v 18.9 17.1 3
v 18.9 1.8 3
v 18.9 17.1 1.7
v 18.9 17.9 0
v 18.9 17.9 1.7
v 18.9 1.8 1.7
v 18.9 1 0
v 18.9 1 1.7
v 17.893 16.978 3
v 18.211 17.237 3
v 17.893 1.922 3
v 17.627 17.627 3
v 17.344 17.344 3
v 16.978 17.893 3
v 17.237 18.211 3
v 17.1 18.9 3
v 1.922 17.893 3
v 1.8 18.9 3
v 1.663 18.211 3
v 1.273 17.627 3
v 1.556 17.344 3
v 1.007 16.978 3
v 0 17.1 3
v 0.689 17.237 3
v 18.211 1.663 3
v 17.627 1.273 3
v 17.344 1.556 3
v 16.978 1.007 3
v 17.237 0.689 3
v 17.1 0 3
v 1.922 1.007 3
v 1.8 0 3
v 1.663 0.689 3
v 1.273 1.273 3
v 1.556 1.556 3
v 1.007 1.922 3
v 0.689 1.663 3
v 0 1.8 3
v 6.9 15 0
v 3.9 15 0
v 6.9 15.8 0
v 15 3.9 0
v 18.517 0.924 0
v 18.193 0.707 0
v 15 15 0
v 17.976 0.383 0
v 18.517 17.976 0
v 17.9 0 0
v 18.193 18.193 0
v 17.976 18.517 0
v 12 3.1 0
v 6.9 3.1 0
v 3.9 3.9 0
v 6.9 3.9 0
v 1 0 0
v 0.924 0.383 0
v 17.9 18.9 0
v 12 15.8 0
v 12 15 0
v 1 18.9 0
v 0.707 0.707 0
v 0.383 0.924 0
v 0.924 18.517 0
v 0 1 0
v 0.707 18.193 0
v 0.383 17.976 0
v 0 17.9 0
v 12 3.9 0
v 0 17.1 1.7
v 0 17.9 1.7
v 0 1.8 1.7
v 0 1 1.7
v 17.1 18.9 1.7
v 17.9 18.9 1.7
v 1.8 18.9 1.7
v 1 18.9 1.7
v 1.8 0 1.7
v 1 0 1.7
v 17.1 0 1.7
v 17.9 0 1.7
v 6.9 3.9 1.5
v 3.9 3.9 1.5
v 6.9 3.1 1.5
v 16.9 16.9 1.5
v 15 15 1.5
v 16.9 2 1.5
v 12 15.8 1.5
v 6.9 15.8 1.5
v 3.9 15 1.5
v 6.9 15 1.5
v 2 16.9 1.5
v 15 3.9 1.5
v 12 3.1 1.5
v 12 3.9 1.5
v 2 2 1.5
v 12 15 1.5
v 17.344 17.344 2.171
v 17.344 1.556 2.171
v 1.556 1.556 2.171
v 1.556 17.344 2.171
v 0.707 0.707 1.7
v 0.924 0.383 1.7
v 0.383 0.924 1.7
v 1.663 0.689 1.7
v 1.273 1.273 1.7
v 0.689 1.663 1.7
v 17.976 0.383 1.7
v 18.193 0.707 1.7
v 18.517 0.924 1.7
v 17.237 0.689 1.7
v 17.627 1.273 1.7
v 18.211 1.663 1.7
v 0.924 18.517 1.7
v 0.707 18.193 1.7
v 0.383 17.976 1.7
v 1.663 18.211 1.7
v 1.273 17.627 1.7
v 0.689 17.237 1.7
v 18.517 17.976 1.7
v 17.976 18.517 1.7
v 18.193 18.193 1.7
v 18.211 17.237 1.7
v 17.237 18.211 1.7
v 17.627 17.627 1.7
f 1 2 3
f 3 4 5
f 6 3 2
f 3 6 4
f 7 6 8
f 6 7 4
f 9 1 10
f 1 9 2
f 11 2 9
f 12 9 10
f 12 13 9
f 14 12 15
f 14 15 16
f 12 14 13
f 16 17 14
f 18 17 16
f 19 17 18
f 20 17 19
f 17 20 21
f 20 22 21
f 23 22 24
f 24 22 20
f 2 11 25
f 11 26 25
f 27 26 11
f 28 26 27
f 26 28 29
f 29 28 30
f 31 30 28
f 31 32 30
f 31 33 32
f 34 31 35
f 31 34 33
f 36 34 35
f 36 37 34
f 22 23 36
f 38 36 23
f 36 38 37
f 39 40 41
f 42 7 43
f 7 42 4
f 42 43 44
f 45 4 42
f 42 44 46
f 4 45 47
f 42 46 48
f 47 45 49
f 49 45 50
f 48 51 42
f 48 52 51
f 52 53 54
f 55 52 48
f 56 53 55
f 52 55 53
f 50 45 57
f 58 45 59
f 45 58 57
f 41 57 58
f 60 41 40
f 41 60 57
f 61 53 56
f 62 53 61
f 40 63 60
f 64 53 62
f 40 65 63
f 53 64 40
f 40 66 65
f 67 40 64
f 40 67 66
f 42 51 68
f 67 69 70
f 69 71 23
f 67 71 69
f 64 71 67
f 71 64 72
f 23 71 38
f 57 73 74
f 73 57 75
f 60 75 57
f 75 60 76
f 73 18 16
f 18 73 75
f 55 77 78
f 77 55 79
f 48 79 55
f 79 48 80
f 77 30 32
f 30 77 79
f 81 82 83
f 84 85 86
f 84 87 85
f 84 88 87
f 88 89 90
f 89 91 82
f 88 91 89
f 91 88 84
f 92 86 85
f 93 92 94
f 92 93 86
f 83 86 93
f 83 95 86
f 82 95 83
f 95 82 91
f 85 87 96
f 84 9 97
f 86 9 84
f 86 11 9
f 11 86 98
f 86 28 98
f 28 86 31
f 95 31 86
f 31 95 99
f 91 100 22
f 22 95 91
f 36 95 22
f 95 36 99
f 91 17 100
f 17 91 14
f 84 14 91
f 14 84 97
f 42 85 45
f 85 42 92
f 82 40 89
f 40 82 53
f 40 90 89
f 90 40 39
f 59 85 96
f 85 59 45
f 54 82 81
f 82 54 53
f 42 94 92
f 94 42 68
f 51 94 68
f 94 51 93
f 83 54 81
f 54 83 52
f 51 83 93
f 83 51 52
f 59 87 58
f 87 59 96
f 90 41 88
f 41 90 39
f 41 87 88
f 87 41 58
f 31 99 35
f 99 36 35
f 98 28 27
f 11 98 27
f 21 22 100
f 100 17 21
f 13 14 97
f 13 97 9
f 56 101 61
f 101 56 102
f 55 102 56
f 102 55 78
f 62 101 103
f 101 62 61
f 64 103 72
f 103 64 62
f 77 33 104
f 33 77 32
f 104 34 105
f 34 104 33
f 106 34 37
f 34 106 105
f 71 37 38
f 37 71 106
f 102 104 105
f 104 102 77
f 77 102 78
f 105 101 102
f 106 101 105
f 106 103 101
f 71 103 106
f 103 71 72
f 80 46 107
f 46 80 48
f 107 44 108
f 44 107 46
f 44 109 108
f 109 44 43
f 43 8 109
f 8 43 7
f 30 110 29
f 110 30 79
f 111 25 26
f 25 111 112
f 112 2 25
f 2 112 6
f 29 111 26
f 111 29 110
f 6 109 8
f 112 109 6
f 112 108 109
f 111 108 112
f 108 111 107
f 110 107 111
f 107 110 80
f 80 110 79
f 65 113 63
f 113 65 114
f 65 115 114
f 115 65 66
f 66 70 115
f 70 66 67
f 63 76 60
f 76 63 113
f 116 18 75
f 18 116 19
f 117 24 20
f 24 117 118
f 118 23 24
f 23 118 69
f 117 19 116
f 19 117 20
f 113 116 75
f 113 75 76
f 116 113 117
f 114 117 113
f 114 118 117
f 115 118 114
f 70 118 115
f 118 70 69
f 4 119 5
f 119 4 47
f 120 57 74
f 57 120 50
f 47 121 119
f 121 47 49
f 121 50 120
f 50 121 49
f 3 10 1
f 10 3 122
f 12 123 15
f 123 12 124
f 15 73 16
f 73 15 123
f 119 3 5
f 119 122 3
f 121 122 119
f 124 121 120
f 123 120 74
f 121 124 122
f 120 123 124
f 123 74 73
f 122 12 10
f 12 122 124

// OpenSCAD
//OpenSCAD-Skript

//Moduldefinition mit Parametern für Frontplattensystem im 19mm-Raster
module FrontElem (
//Parameter
xwert=1,        //Anzahl der Segmente in horizontaler Richtung
ywert=1,        //Anzahl der Segmente in vertikaler Richtung
segment=18.9,   //Kantenlänge des Segments
hght=3.0,       //Höhe des Rands des Frontplattensegments
thick=1.5,      //verbleibende Dicke des Frontplattensegments
wo=1.0,         //Wandstärke oben
wu=2.0,         //Wandstärke unten
M3=false,       //Bohrungen für M3-Zylinderkopf-Inbusschraube
skd3=5.6,       //Schraubenkopfdurchmesser M3-Schraube
skh3=3.3,       //Schraubenkopfhöhe M3-Schraube
dsh3=3.1,       //Schaftdurchmesser M3-Schraube
dvst3=7,        //Verstärkung für M3-Schraube
B2mm=true,      //Bohrungen für 2mm-Schneidschrauben
skd2=3.6,       //Schraubenkopfdurchmesser 2mm-Schraube (4.4)
skh2=1.3,       //Schraubenkopfhöhe 2mm-Schraube
dsh2=2.0,       //Schaftdurchmesser 2mm-Schraube
dvst2=4.4,      //Verstärkung für 2mm-Schraube
Btext=6.0,      //Breite Beschriftungsband
Ltext=12,       //Länge Beschriftungsband
Dtext=0.3,      //Tiefe Beschriftungsfeld, oder Null
LEDdia=5.0,     //Durchmesser LED
LEDr=5.0,       //Kantenlänge quadratische LED
LEDB=5.0,       //Breite der Rechteck-LED
LEDH=3.0,       //Höhe der Rechteck-LED
KSWdia=6.0,     //Schaftdurchmesser Kippschalter
RSWdia=9.2,     //Schaftdurchmesser Drehschalter
RSWdist=9.4,    //Mittenabstand Pin
RSWpin=3.0,     //Durchmesser Pin
POTdia=6.8,     //Schaftdurchmesser Poti
TRMdia=4.0,     //Bohrung für Polklemme M4
TRSdia=6.0,     //Bohrung für Telefonbuchse 4mm
MCdia=11.8,     //Bohrung für MC-Buchse 4mm
MCdist=10.4,    //Abstand Abflachungen
BNCdia=9.5,     //Durchmesser Bohrung
BNCdist=8.0,    //Abstand Abflachung
PM3B=22.5,      //Breite Panelmeter 3-stellig
PM3H=14.5,      //Höhe Panelmeter 3-stellig
PM4B=30.0,      //Breite Panelmeter 4-stellig
PM4H=14.2,     //Höhe Panelmeter 4-stellig
leni=6,leno=13.1,swl=8.1,swh=4.1,balken=5.1
)
//Beginn Modul
{
difference(){   //difference 1
union(){        //union 1
difference(){   //difference 2
union(){        //union 2
    //alles, was vor der nächsten geschweiften Klammer steht, wird zusammengefügt (union 2)
//Körper des Frontplattensegments
cube([xwert*segment, ywert*segment, hght]);


}               //union 2 end
    //alles, was vor der nächsten geschweiften Klammer steht, wird davon abgezogen (difference 2)
//Einsenkung in das Segment
polyhedron(
               points= [[wu,wu,thick],                                  //0 unten
                        [xwert*segment-wu,wu,thick],                    //1 unten
                        [xwert*segment-wu,ywert*segment-wu,thick],      //2 unten
                        [wu,ywert*segment-wu,thick],                    //3 unten
                        [wo,wo,hght+0.01],                              //4 oben
                        [wo,ywert*segment-wo, hght+0.01],               //5 oben
                        [xwert*segment-wo,ywert*segment-wo,hght+0.01],  //6 oben
                        [xwert*segment-wo,wo,hght+0.01],                //7 oben
                       ],
               faces=  [[0,1,2,3],      //Boden
                        [0,4,7,1],      //Deckel
                        [1,7,6,2],      //Front
                        [2,6,5,3],      //Seitenwand rechts
                        [3,5,4,0],      //Rückwand
                        [4,5,6,7]]      //Seitenwand links
               );   
//Ausschnitt für Tasterhülse
translate([(xwert*segment)/2-leno/2+1,(ywert*segment)/2-leno/2+1,-0.1]) cube([leno-2,leno-2,swh+swl]);
translate([(xwert*segment)/2-balken/2,(ywert*segment)/2-leno/2+0.2,-0.1]) cube([balken,(leno-leni)/2-0.8,swh+swl+3]);
translate([(xwert*segment)/2-balken/2,(ywert*segment)/2+leno/2-0.2-(leno-leni)/2+0.8,-0.1]) cube([balken,(leno-leni)/2-0.8,swh+swl+3]);

/*
//Bohrung für LED mittig (Mindestgröße 1x1)
translate([xwert*segment/2,ywert*segment/2-3,-0.1])  cylinder(d=LEDdia, h=10, $fn=32);
*/

/*
//Bohrung für LED nach unten versetzt mit Textfeld darüber (Mindestgröße 1x1, bei 10mm LED 1x2)
translate([xwert*segment/2,ywert*segment/2-3,-0.1])  cylinder(d=LEDdia, h=10, $fn=32);
translate([xwert*segment/2-Ltext/2,ywert*segment/2,thick-Dtext+0.05])  cube([Ltext, Btext, Dtext]); 
*/

/*
//Bohrung für Kippschalter mittig (Mindestgröße 1x1)
translate([xwert*segment/2,ywert*segment/2,-0.1])  cylinder(d=KSWdia, h=10, $fn=32); 
*/

/*
//Bohrungen für Drehschalter mit Pin (Mindestgröße 2x2)
translate([xwert*segment/2,ywert*segment/2,-0.1])  cylinder(d=RSWdia, h=10, $fn=32);
translate([xwert*segment/2+RSWdist,ywert*segment/2,-0.1])  cylinder(d=RSWpin, h=1.5, $fn=32);
*/

/*
//Bohrung für Potentiometer 3mm-Schaft (Mindestgröße 1x1)
translate([xwert*segment/2,ywert*segment/2,-0.1])  cylinder(d=POTdia, h=10, $fn=32);
*/

/*
//Bohrung für 4mm-Polklemme M4 (Mindestgröße 1x1)
translate([xwert*segment/2,ywert*segment/2,-0.1])  cylinder(d=TRMdia, h=10, $fn=32);
*/       

/*
//Bohrung für 4mm-Telefonbuchse (Mindestgröße 1x1)
translate([xwert*segment/2,ywert*segment/2,-0.1])  cylinder(d=TRSdia, h=10, $fn=32);
*/

/*
//Bohrung für 4mm-MC-Buchse (Mindestgröße 2x2), siehe auch union1 für Abflachungen
translate([xwert*segment/2,ywert*segment/2,-0.1])  cylinder(d=MCdia, h=10, $fn=32);
*/

/*
//Bohrung für BNC-Buchse (Mindestgröße 1x1), siehe auch union1 für Abflachungen
translate([xwert*segment/2,ywert*segment/2,-0.1])  cylinder(d=BNCdia, h=10, $fn=32);
*/

/*
//Ausschnitt Panelmeter 3-stellig (Mindestgröße 2x1)
translate([xwert*segment/2-PM3B/2,ywert*segment/2-PM3H/2,-0.1])  cube([PM3B, PM3H, 10]);
*/

/*
//Ausschnitt Panelmeter 4-stellig (Mindestgröße 2x1)
translate([xwert*segment/2-PM4B/2,ywert*segment/2-PM4H/2,-0.1])  cube([PM4B, PM4H, 10]);
*/       
        
}  //difference 2 end
    //alles, was vor der nächsten geschweiften Klammer steht, wird dazu hinzugefügt (union 1)
//Verstärkungen für Schrauben x-Achse unten
for (x=[0:segment:xwert*segment])
{
if (M3==true) translate([x,0,0]) cylinder(d=dvst3,h=hght,$fn=16);
if (B2mm==true) translate([x,0,0]) cylinder(d=dvst2,h=hght,$fn=16);
}
//Verstärkungen für Schrauben x-Achse oben
for (x=[0:segment:xwert*segment])
{
if (M3==true) translate([x,ywert*segment,0]) cylinder(d=dvst3,h=hght,$fn=16);
if (B2mm==true) translate([x,ywert*segment,0]) cylinder(d=dvst2,h=hght,$fn=16);
}
//Verstärkungen für Schrauben y-Achse links
for (y=[0:segment:ywert*segment])
{
if (M3==true) translate([0,y,0]) cylinder(d=dvst3,h=hght,$fn=16);
if (B2mm==true) translate([0,y,0]) cylinder(d=dvst2,h=hght,$fn=16);
}
//Verstärkungen für Schrauben y-Achse rechts
for (y=[0:segment:ywert*segment])
{
if (M3==true) translate([xwert*segment,y,0]) cylinder(d=dvst3,h=hght,$fn=16);
if (B2mm==true) translate([xwert*segment,y,0]) cylinder(d=dvst2,h=hght,$fn=16);
}

/*
//Abflachungen für 4mm-MC-Buchse (Mindestgröße 2x2)
translate([xwert*segment/2-5,ywert*segment/2+MCdist/2,0])  cube([10,3,thick]);
translate([xwert*segment/2-5,ywert*segment/2-MCdist/2-3,0])  cube([10,3,thick]);
*/

/*
//Abflachungen für BNC-Buchse (Mindestgröße 1x1)
translate([xwert*segment/2-5,ywert*segment/2+BNCdist/2,0])  cube([10,3,thick]);
translate([xwert*segment/2-5,ywert*segment/2-BNCdist/2-3,0])  cube([10,3,thick]);
*/

}               //union 1 end
    //alles, was vor der nächsten geschweiften Klammer steht, wird davon wieder abgezogen (difference 1)
//Bohrungen für Schrauben x-Achse unten
for (x=[0:segment:xwert*segment])
{
if (M3==true) translate([x,0,-0.1]) cylinder(d=dsh3,h=2*hght,$fn=16);
if (M3==true) translate([x,0,hght-skh3]) cylinder(d=skd3,h=2*hght,$fn=16);
if (B2mm==true) translate([x,0,-0.1]) cylinder(d=dsh2,h=2*hght,$fn=16);
if (B2mm==true) translate([x,0,hght-skh2]) cylinder(d=skd2,h=2*hght,$fn=16); 
}
//Bohrungen für Schrauben x-Achse oben
for (x=[0:segment:xwert*segment])
{
if (M3==true) translate([x,ywert*segment,-0.1]) cylinder(d=dsh3,h=2*hght,$fn=16);
if (M3==true) translate([x,ywert*segment,hght-skh3]) cylinder(d=skd3,h=2*hght,$fn=16);
if (B2mm==true) translate([x,ywert*segment,-0.1]) cylinder(d=dsh2,h=2*hght,$fn=16);
if (B2mm==true) translate([x,ywert*segment,hght-skh2]) cylinder(d=skd2,h=2*hght,$fn=16); 
}
//Bohrungen für Schrauben y-Achse links
for (y=[0:segment:ywert*segment])
{
if (M3==true) translate([0,y,-0.1]) cylinder(d=dsh3,h=2*hght,$fn=16);
if (M3==true) translate([0,y,hght-skh3]) cylinder(d=skd3,h=2*hght,$fn=16);
if (B2mm==true) translate([0,y,-0.1]) cylinder(d=dsh2,h=2*hght,$fn=16);
if (B2mm==true) translate([0,y,hght-skh2]) cylinder(d=skd2,h=2*hght,$fn=16); 
}
//Bohrungen für Schrauben y-Achse rechts
for (y=[0:segment:ywert*segment])
{
if (M3==true) translate([xwert*segment,y,-0.1]) cylinder(d=dsh3,h=2*hght,$fn=16);
if (M3==true) translate([xwert*segment,y,hght-skh3]) cylinder(d=skd3,h=2*hght,$fn=16);
if (B2mm==true) translate([xwert*segment,y,-0.1]) cylinder(d=dsh2,h=2*hght,$fn=16);
if (B2mm==true) translate([xwert*segment,y,hght-skh2]) cylinder(d=skd2,h=2*hght,$fn=16); 
}
//Abschneiden Verstärkungen unten
translate([-250,-10,-0.1])
cube([500,10,25]);
//Abschneiden Verstärkungen oben
translate([-250,ywert*segment,-0.1])
cube([500,10,25]);
//Abschneiden Verstärkungen links
translate([-10,-250,-0.1])
cube([10,500,25]);
//Abschneiden Verstärkungen rechts
translate([xwert*segment,-250,-0.1])
cube([10,500,25]);
}               //difference 1 end

}  //module end

//Hier werden Instanzen des Moduls aufgerufen
translate([0,0,0]) FrontElem();
